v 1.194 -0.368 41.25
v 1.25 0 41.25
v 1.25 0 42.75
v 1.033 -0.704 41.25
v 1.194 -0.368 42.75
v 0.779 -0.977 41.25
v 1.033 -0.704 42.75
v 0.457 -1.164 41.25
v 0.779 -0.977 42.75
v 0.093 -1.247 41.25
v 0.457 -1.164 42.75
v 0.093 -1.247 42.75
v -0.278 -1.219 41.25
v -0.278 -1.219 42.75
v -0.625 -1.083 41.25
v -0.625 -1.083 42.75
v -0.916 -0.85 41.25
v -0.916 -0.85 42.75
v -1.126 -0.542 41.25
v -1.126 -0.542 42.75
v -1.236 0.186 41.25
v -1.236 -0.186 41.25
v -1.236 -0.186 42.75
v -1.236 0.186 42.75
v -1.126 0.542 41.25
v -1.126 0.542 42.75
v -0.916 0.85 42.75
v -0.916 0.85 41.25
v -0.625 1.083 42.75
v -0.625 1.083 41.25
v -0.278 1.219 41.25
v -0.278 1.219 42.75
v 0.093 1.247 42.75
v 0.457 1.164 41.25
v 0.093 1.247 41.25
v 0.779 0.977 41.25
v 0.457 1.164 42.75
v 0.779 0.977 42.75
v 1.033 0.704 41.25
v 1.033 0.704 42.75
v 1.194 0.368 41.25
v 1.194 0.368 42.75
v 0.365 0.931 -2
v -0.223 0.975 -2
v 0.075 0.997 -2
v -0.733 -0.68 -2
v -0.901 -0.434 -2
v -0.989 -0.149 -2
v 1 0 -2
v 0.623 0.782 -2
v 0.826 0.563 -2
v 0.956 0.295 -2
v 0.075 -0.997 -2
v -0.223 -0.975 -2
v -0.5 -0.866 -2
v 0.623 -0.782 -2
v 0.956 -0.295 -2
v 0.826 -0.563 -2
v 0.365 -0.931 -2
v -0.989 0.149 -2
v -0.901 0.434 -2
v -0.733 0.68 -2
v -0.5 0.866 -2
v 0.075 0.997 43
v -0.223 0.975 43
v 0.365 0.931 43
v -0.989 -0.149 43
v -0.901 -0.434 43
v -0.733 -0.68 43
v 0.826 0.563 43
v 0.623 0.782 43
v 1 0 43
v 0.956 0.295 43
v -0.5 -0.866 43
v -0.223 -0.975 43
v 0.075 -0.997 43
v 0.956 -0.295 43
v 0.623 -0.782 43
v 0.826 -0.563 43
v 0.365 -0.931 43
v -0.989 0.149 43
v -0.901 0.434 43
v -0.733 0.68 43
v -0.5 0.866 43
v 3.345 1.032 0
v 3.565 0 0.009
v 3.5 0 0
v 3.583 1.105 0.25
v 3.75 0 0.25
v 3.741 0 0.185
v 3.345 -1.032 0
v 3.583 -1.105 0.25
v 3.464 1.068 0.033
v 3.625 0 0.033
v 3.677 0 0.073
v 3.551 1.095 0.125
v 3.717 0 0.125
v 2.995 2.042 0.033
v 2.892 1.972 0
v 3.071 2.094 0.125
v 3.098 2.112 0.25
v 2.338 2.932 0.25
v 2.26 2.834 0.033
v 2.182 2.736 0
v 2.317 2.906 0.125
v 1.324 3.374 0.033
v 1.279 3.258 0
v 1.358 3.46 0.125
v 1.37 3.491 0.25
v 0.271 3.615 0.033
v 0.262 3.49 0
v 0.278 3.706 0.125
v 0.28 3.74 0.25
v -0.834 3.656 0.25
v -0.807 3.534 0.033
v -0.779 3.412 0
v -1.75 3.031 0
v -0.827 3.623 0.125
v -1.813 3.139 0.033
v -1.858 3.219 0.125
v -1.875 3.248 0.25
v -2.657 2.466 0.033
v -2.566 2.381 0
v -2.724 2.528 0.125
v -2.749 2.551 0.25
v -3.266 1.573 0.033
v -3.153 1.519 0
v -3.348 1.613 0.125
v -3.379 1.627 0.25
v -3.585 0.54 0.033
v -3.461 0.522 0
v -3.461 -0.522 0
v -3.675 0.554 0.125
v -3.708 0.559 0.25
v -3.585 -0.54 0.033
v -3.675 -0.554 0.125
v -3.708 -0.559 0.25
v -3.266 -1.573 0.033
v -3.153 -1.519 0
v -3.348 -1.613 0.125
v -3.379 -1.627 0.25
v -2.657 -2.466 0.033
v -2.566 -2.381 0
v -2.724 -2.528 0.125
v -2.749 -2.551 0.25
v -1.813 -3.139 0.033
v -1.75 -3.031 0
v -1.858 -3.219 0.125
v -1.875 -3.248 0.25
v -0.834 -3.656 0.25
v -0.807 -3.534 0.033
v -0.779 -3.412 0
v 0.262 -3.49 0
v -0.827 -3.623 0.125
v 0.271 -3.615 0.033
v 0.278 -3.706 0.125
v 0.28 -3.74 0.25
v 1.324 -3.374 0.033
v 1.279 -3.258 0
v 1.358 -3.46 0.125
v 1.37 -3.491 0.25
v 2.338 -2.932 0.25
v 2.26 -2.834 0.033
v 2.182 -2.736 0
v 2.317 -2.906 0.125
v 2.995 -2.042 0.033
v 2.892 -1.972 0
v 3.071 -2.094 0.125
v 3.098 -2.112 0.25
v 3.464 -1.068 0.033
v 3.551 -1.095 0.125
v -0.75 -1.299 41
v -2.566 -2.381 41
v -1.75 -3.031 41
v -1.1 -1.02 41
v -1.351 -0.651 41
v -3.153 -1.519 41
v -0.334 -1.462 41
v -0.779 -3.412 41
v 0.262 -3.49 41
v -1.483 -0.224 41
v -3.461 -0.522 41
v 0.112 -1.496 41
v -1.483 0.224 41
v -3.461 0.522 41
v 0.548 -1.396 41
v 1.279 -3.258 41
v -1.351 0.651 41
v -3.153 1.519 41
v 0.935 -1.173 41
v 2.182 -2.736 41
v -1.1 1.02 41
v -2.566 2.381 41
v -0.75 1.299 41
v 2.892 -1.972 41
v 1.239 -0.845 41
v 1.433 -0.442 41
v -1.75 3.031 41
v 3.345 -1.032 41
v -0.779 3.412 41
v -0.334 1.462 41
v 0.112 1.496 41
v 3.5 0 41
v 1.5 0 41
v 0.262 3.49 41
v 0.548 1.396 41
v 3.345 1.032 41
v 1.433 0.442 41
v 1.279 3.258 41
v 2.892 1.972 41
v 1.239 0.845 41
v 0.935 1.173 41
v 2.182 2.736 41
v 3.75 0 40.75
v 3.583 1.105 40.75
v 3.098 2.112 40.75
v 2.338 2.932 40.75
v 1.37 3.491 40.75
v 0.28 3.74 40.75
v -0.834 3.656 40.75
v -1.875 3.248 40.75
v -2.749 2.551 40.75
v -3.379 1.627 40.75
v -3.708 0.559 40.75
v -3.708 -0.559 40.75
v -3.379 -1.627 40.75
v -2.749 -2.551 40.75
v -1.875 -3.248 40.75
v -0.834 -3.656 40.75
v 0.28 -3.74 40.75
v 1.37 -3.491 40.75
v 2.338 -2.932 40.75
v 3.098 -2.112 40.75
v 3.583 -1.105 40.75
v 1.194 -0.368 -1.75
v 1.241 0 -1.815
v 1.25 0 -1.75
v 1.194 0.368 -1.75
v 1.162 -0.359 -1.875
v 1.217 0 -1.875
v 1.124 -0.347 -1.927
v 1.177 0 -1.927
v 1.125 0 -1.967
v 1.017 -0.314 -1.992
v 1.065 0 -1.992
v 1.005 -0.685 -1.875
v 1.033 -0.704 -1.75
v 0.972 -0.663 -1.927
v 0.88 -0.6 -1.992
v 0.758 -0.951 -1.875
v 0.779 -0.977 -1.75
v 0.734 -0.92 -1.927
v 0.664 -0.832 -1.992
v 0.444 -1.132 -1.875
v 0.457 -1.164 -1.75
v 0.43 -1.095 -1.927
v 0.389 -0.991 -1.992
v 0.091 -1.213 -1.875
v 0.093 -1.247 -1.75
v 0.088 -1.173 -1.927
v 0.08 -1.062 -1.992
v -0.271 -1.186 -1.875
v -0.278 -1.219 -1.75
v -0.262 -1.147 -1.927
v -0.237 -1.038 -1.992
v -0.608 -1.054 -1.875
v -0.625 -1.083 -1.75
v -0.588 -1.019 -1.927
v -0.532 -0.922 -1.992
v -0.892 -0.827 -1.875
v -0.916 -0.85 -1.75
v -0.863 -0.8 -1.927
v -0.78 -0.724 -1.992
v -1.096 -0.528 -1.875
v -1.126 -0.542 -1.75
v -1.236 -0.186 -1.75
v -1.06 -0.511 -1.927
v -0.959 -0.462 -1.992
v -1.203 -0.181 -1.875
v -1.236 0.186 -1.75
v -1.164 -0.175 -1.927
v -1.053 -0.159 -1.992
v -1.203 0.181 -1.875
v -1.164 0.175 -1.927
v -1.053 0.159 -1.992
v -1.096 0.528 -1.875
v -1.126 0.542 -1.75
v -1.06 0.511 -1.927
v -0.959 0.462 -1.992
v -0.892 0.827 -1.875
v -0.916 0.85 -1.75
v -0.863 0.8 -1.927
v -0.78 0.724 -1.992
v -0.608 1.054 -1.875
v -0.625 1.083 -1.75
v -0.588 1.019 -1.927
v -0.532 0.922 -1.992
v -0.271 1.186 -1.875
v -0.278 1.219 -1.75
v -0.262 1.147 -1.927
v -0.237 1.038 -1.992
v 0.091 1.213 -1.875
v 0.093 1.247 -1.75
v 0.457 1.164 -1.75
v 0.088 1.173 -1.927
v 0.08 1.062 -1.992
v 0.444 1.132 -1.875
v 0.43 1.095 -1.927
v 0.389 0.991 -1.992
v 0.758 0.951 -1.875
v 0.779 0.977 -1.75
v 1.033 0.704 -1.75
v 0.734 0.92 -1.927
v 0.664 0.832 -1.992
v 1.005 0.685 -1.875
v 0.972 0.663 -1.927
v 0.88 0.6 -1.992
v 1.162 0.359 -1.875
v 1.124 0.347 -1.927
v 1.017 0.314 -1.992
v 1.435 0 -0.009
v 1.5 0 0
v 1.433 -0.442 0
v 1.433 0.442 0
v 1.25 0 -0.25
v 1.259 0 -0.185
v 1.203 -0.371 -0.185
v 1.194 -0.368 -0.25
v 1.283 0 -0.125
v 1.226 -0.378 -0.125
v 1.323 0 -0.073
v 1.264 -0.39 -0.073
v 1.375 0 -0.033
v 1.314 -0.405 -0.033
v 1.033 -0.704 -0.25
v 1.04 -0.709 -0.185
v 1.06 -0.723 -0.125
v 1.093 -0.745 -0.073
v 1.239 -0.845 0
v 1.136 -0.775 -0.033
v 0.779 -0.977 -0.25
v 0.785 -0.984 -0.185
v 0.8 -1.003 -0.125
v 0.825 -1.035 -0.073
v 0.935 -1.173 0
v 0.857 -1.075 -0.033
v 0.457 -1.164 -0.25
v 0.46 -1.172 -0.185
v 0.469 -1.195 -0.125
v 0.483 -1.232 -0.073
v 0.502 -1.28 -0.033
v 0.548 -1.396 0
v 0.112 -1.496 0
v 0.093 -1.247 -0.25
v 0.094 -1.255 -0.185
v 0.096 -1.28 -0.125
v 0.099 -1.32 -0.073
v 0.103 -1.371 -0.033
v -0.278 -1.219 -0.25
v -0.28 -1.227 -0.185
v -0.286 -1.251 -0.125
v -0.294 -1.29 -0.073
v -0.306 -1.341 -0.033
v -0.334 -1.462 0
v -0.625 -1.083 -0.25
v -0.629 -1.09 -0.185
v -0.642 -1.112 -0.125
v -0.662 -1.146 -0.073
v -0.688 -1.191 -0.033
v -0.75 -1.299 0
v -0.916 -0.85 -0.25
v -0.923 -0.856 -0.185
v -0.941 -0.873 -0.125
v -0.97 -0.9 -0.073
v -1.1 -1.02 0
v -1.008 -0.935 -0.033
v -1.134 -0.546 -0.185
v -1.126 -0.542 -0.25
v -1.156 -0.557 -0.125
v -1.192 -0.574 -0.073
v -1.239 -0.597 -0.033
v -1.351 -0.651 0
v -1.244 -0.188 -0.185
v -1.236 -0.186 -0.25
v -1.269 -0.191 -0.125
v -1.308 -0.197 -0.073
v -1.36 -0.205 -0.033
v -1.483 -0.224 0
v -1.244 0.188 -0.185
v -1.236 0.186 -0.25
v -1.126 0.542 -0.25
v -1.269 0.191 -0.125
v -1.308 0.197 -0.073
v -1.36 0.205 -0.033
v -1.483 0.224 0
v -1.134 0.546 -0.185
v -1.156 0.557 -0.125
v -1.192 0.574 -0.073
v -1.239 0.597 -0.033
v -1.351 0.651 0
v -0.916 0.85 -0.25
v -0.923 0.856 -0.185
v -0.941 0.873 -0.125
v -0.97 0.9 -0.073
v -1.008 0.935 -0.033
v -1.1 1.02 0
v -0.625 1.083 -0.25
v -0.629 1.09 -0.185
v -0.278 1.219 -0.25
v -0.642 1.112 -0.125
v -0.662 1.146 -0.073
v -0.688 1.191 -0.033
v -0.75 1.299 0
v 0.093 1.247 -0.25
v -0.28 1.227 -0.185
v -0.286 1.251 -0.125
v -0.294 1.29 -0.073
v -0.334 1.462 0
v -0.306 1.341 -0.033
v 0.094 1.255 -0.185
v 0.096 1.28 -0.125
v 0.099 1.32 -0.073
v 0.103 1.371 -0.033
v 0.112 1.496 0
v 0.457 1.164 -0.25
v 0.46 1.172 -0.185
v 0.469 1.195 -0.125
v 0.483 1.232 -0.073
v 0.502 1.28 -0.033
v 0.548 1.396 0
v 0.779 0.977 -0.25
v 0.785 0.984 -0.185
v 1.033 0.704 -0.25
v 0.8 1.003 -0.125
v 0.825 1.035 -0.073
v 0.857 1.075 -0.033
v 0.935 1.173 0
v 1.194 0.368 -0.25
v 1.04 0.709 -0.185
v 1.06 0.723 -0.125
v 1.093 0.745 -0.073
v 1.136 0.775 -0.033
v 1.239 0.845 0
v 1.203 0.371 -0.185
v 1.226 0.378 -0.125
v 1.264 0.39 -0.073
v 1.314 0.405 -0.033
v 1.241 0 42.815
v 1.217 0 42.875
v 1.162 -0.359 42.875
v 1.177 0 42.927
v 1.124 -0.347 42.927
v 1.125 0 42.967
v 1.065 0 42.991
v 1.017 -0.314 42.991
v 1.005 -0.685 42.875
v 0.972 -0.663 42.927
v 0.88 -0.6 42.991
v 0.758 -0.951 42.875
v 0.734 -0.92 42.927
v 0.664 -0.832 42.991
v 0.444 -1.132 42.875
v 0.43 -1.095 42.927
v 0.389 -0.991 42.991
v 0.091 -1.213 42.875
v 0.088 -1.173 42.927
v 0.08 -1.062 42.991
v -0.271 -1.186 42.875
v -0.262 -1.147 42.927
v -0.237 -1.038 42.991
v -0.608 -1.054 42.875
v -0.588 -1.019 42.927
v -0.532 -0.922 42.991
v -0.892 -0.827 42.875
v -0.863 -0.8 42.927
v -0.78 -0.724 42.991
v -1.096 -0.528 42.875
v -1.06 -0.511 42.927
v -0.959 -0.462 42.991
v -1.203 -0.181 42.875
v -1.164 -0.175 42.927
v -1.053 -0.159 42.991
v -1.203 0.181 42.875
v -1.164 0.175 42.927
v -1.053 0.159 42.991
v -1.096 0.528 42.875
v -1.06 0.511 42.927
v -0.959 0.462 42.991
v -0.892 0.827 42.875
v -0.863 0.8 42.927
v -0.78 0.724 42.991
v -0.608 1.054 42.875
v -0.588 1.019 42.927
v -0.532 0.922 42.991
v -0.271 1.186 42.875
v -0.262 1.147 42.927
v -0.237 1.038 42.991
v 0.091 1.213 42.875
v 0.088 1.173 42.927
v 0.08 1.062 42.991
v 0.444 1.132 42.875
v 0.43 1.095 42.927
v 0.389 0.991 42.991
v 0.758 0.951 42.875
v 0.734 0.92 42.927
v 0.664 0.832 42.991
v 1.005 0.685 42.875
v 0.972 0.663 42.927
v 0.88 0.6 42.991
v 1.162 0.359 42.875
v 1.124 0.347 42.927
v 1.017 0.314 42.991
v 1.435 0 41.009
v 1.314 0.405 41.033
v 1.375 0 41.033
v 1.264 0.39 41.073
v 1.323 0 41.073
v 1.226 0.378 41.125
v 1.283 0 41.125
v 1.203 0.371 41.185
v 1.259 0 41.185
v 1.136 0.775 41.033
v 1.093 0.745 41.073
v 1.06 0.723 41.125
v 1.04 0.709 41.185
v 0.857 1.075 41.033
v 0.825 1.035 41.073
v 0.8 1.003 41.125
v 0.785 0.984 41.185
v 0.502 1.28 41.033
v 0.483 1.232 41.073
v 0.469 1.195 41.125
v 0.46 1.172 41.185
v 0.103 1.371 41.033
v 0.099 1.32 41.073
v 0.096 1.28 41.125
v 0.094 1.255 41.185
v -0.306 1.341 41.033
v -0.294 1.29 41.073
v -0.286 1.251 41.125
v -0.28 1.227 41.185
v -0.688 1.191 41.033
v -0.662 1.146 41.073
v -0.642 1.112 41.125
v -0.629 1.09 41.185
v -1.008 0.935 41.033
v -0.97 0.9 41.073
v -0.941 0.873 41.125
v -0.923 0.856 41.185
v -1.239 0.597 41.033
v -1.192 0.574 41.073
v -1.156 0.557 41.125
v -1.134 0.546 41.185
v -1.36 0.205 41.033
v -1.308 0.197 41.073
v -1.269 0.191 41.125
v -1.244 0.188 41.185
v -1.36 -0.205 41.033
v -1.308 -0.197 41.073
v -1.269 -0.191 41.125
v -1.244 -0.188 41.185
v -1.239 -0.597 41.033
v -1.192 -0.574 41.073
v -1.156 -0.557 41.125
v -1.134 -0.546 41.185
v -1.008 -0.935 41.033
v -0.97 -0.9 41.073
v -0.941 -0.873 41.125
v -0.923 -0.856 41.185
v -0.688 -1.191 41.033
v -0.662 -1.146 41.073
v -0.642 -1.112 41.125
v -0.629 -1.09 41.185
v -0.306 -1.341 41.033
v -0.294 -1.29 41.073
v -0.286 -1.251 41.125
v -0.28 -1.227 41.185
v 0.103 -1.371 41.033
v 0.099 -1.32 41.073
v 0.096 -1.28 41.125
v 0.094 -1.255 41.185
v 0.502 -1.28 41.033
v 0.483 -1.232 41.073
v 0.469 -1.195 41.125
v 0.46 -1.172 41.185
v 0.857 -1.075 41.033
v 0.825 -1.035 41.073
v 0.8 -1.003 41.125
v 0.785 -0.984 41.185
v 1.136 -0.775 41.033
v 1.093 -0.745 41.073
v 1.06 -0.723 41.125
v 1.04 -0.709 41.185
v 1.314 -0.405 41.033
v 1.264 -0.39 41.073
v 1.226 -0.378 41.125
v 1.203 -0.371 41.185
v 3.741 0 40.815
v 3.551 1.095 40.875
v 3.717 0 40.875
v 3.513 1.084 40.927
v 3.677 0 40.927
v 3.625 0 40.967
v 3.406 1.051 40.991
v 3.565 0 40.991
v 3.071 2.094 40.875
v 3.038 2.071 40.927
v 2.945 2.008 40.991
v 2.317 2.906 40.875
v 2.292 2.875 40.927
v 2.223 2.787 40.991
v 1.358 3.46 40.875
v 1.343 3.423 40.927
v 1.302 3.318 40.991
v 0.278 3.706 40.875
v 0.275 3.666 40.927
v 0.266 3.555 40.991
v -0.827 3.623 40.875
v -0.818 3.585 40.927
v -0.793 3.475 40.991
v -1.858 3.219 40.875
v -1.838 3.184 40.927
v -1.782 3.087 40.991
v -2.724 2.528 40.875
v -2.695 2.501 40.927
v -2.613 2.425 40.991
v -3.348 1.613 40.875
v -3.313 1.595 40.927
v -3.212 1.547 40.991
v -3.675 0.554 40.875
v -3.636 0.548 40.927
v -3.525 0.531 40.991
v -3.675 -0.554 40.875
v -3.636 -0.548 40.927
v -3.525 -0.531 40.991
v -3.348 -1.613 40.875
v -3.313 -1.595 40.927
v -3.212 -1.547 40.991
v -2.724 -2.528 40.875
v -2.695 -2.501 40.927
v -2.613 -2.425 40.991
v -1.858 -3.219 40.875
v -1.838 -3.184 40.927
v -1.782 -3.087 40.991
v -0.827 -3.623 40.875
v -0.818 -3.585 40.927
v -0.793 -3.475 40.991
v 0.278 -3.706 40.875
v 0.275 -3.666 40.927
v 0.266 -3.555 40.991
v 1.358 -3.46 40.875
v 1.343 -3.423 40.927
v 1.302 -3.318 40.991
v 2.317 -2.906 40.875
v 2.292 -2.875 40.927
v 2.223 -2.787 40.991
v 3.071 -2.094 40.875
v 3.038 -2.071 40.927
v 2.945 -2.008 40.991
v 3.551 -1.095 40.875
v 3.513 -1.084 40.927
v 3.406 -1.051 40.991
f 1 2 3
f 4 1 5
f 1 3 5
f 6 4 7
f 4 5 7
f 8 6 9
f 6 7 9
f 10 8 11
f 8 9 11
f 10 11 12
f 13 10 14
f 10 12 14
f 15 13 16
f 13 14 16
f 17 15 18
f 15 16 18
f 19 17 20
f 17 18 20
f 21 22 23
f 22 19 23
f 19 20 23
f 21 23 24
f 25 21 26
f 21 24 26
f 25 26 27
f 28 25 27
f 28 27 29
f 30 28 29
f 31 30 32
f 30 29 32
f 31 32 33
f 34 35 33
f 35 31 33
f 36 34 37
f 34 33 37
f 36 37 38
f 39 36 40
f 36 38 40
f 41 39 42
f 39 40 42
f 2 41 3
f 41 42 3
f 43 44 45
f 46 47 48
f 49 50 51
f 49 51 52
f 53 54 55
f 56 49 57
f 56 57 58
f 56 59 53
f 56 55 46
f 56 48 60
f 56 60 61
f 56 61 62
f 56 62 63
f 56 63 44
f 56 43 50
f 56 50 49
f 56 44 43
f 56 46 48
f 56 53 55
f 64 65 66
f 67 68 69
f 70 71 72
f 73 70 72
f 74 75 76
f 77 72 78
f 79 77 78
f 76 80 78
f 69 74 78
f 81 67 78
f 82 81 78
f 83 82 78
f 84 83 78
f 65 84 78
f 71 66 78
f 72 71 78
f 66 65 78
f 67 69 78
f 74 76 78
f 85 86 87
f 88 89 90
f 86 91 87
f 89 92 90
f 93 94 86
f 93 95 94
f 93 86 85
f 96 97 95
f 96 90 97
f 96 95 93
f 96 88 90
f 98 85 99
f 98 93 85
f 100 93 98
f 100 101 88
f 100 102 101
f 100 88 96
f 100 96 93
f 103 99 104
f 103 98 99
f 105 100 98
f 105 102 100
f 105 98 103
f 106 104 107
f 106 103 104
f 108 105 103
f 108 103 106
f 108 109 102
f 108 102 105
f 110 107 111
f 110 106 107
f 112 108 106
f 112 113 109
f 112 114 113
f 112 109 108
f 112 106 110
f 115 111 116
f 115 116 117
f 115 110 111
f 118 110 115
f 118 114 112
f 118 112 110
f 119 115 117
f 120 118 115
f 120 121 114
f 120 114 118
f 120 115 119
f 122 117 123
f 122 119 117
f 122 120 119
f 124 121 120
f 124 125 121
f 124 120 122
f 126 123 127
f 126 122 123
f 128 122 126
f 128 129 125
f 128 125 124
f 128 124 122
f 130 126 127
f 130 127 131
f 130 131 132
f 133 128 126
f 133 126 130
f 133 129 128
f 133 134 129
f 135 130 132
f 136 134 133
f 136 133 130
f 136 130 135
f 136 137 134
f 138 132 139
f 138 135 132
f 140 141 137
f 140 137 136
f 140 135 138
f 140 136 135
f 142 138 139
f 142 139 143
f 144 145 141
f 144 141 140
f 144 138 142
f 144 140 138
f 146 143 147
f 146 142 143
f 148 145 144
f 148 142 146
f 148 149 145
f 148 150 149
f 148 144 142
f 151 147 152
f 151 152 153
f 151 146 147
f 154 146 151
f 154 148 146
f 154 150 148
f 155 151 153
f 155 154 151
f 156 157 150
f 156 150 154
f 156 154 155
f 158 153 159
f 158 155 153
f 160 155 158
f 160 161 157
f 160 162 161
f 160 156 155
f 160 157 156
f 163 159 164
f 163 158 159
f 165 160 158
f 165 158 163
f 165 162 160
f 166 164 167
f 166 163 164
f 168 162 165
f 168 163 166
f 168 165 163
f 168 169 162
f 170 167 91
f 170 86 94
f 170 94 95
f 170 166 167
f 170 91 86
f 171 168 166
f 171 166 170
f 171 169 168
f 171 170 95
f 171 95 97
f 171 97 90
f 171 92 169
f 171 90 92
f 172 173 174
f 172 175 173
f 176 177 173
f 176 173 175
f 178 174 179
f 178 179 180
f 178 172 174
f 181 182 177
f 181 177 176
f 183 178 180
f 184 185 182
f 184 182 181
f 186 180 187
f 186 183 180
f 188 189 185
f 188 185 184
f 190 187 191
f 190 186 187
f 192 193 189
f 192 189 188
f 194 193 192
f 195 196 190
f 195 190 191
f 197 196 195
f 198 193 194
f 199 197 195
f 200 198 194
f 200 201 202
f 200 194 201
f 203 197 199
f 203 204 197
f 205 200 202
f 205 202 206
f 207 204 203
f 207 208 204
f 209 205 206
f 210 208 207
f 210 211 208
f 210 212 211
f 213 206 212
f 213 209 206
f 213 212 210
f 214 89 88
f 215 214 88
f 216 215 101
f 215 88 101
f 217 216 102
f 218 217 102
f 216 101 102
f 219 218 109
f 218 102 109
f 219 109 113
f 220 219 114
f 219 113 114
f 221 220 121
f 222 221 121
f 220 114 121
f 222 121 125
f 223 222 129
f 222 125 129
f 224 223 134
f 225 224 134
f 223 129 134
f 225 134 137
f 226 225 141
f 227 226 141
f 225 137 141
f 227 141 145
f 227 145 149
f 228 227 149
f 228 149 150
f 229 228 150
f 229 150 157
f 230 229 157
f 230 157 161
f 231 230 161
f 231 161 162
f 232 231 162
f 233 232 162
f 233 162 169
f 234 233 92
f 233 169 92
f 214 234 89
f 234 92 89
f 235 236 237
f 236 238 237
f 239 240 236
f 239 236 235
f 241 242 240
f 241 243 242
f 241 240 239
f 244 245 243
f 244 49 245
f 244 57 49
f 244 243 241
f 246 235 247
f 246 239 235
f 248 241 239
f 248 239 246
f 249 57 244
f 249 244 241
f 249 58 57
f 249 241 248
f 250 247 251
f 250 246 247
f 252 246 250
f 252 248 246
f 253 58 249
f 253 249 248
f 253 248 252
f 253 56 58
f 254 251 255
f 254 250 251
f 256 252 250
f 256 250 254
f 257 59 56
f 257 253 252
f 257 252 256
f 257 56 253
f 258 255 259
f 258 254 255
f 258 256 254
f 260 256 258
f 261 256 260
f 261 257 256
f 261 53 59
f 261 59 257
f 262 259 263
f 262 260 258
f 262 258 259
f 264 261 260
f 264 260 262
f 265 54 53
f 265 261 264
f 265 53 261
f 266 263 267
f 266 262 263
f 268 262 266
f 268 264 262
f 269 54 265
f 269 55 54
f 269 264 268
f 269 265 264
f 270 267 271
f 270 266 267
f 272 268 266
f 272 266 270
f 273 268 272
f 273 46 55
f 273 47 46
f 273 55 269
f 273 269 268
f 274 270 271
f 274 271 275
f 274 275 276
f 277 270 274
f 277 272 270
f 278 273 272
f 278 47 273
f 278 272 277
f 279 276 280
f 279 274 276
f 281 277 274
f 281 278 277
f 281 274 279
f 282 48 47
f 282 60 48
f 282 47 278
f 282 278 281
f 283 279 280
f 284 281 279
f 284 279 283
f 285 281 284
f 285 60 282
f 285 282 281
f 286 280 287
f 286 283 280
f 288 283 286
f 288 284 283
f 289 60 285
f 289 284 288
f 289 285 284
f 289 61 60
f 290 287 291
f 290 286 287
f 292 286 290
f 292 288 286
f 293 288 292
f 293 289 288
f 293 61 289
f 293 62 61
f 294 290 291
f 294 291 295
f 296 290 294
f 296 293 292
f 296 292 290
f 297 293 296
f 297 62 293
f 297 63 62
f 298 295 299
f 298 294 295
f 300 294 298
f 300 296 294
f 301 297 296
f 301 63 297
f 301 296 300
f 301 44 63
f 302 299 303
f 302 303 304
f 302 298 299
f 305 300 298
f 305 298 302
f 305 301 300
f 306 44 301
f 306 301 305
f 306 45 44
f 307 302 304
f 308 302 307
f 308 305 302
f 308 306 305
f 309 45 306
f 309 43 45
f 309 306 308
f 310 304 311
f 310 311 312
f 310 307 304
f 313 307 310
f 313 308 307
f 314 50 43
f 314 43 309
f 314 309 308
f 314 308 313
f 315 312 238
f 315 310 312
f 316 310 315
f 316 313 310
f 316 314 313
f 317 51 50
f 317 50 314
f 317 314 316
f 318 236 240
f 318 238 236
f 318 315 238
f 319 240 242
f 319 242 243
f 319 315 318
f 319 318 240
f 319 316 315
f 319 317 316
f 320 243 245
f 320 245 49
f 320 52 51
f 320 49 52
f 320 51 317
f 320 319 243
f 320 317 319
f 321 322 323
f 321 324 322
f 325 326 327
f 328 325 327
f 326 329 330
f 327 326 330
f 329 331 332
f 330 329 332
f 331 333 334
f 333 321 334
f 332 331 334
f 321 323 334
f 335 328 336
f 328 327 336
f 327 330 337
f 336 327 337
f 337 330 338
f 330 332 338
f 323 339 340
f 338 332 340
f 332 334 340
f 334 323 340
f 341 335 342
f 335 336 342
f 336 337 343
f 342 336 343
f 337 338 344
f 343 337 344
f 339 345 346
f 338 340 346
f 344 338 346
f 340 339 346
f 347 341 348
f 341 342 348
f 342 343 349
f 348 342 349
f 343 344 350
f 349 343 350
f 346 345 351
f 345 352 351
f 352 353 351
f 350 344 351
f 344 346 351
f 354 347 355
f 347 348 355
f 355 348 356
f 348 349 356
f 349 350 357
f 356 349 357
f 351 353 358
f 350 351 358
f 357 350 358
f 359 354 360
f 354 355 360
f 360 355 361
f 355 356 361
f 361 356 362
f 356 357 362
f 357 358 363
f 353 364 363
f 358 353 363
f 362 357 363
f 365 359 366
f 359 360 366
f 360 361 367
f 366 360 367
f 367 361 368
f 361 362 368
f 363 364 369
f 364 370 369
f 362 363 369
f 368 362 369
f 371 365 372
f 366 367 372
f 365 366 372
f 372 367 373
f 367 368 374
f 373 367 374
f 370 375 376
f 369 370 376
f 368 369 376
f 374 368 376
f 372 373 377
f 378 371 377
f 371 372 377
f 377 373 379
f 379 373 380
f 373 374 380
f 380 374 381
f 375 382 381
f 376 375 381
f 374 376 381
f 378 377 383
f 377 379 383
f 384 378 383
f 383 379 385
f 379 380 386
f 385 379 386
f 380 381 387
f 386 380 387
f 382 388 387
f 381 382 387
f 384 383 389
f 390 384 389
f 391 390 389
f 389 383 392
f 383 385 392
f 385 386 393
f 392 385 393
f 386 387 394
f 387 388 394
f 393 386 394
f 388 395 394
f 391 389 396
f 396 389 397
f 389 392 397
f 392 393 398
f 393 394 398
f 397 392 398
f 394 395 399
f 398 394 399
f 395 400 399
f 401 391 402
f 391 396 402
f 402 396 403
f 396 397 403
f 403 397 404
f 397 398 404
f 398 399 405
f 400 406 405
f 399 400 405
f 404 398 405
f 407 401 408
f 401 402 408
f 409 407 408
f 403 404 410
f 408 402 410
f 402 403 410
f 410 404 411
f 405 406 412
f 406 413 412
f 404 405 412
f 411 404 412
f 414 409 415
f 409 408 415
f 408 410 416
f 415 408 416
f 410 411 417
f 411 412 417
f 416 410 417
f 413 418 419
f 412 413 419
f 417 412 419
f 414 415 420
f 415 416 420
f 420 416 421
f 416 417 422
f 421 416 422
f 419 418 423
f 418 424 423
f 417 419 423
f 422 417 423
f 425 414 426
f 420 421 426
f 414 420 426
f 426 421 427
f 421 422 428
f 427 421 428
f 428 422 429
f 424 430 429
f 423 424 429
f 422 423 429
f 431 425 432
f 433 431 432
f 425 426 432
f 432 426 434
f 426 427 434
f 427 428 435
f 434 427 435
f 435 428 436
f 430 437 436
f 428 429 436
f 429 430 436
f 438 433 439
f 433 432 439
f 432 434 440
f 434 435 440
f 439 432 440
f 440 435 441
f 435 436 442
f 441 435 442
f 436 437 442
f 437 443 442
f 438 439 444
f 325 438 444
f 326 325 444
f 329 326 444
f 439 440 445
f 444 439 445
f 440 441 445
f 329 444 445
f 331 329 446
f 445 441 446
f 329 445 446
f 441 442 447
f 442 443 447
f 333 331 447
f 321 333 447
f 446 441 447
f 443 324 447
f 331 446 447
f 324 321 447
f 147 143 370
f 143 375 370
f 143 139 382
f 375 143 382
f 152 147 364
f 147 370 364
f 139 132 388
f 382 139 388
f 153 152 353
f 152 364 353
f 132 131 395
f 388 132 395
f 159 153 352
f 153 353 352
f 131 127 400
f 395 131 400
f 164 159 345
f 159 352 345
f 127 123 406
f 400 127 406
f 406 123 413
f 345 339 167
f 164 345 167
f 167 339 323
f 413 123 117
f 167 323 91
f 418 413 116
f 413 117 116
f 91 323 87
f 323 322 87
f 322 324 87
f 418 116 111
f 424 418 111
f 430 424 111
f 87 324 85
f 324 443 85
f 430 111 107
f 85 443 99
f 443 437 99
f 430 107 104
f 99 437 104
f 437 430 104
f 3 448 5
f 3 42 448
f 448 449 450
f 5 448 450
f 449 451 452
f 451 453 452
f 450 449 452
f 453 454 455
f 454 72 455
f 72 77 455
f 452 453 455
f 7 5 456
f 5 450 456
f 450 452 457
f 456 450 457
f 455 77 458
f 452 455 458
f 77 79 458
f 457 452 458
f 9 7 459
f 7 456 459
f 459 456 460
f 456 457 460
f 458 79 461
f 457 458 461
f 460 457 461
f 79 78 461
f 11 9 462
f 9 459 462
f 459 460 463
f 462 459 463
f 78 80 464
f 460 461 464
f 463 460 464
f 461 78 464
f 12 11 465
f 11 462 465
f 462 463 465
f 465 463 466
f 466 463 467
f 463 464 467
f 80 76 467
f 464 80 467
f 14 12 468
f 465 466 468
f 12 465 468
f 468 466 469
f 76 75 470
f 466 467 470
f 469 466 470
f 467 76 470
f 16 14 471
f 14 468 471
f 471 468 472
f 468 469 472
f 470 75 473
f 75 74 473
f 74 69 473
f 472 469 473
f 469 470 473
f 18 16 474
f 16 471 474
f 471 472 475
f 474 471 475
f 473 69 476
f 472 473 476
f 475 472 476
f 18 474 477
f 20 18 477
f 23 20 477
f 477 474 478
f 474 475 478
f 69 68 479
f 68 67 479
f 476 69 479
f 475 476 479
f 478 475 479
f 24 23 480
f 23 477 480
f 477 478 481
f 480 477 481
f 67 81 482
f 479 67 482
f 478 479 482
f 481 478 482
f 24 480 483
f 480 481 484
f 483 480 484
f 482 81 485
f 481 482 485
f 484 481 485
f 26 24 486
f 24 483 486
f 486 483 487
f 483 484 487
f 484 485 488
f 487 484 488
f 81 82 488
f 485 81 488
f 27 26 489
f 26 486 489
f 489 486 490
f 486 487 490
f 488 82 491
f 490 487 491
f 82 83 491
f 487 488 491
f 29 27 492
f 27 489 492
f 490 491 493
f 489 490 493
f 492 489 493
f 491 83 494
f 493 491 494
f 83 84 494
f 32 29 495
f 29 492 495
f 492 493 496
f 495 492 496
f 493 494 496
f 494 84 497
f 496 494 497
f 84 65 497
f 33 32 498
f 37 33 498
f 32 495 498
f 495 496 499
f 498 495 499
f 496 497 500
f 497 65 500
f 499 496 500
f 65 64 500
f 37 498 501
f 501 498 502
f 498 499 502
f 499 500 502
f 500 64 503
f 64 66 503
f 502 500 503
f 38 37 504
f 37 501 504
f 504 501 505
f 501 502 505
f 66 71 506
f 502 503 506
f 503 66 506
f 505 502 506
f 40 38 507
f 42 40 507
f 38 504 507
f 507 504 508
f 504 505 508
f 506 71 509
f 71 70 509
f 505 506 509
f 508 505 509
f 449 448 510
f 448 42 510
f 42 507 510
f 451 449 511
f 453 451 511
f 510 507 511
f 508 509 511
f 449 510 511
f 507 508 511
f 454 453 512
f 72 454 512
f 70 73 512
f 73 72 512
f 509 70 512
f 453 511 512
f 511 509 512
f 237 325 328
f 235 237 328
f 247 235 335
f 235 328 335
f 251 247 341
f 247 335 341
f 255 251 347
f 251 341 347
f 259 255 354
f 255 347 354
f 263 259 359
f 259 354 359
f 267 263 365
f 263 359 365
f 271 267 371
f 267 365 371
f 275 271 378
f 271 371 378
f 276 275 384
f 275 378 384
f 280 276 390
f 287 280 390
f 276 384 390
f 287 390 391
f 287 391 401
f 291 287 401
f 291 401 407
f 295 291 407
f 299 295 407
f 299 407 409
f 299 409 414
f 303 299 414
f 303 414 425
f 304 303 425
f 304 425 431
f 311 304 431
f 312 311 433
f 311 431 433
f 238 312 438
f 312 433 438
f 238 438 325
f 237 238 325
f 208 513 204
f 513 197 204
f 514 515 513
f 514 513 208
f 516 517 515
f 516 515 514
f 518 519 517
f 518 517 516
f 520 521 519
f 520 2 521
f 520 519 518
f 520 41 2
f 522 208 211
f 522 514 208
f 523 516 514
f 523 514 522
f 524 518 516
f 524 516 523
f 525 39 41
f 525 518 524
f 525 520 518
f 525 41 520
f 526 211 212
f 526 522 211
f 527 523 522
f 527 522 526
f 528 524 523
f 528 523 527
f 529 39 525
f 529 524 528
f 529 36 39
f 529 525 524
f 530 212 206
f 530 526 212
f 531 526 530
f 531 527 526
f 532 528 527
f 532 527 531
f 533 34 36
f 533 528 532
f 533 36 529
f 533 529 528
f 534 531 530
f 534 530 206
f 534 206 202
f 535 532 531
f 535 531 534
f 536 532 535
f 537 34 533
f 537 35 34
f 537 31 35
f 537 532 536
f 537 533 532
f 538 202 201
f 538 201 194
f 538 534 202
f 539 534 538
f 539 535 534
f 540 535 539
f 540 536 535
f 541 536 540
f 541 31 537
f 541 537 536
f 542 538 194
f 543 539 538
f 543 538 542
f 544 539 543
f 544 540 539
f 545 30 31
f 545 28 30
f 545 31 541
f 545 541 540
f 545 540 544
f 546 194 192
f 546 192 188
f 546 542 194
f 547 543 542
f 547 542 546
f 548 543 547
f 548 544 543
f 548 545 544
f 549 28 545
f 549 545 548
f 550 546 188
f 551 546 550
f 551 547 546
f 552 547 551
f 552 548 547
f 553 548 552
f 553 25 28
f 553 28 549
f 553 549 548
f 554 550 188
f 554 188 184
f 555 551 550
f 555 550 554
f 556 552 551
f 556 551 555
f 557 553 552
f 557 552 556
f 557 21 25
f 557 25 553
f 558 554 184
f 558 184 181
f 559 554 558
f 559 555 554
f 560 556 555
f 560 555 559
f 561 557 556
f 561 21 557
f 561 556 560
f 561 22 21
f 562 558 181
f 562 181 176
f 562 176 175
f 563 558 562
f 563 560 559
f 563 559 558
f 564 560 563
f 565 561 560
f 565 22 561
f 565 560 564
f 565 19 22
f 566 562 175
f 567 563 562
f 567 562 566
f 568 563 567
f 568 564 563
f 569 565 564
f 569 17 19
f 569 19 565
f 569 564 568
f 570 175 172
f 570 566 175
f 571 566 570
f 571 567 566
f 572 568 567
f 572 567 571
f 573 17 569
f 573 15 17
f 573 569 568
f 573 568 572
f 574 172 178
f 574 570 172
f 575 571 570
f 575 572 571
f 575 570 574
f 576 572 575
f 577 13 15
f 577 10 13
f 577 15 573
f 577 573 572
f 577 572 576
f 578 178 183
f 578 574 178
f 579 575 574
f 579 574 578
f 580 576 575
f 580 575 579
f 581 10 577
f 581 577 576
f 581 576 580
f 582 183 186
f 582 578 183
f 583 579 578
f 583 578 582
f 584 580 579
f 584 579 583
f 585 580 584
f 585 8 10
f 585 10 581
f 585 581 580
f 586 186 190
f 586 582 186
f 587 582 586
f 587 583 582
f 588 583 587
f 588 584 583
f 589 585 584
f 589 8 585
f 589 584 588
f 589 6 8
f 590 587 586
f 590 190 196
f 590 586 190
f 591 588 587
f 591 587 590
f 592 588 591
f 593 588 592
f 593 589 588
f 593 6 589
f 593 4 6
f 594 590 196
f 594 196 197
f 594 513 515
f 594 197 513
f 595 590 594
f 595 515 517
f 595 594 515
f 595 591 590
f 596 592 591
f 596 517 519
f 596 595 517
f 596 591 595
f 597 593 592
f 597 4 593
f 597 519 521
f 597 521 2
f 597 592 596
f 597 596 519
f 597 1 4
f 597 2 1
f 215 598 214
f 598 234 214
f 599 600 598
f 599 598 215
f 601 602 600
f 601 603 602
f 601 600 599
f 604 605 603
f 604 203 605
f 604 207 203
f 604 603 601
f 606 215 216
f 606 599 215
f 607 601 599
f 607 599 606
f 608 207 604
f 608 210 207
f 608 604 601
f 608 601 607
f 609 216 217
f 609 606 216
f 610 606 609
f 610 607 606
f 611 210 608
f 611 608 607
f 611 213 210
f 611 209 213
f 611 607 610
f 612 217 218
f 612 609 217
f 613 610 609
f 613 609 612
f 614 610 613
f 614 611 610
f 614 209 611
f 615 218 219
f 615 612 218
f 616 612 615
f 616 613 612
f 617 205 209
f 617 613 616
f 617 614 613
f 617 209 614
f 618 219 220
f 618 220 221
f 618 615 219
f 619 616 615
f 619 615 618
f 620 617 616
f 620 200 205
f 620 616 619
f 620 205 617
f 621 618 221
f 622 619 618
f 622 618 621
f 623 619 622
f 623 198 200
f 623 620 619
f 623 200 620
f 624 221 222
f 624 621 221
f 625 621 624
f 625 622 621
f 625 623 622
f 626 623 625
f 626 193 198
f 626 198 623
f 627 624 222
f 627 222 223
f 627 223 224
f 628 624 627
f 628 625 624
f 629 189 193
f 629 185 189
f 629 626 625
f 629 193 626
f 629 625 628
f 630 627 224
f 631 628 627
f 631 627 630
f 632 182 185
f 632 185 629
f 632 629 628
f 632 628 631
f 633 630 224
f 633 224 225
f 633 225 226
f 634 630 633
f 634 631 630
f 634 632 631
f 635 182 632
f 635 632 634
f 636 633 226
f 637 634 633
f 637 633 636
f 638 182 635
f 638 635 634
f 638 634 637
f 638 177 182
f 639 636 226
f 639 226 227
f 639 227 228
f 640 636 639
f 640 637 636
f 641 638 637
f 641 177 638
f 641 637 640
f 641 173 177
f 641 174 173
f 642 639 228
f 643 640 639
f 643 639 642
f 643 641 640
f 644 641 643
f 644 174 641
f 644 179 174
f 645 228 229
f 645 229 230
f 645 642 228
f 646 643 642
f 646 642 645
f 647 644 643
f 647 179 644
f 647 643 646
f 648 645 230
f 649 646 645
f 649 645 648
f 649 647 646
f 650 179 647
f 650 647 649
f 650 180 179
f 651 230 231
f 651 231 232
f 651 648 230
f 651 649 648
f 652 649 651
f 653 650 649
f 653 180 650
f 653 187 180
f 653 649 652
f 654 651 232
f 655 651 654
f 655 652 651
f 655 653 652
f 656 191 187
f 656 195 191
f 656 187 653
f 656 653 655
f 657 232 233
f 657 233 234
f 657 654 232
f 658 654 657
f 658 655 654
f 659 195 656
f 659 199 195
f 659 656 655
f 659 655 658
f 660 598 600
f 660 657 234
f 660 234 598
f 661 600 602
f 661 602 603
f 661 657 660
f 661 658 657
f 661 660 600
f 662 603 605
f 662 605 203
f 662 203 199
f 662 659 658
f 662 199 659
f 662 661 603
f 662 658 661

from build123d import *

# Parameters (mm, degrees)
CROQUIS1_R                   = 3.75
SALIENTE_EXTRUIR1_DEPTH      = 41
CROQUIS2_R                   = 1.25
SALIENTE_EXTRUIR2_DEPTH      = 2
SALIENTE_EXTRUIR3_DEPTH      = 0.0001
SALIENTE_EXTRUIR3_DEPTH_BACK = 45
CROQUIS3_R                   = 1.25
REDONDEO9_R                  = 0.25


with BuildPart() as part:
    # Croquis1 → Saliente-Extruir1 (new body)
    with BuildSketch(Plane.XY):
        Circle(CROQUIS1_R)
    extrude(amount=SALIENTE_EXTRUIR1_DEPTH)

    # Croquis2 → Saliente-Extruir2 (add)
    with BuildSketch(Plane(origin=(0, 0, 0), x_dir=(-1, 0, 0), z_dir=(0, 0, -1))):
        with Locations(Location((0, 0, 0), (0, 0, 180))):
            Circle(CROQUIS2_R)
    extrude(amount=SALIENTE_EXTRUIR2_DEPTH)

    # Croquis3 → Saliente-Extruir3 (add, two sides: drawn at the far end of the back side and taken through both)
    with BuildSketch(Plane(origin=(0, 0, -2), x_dir=(-1, 0, 0), z_dir=(0, 0, -1)).offset(-SALIENTE_EXTRUIR3_DEPTH_BACK)):
        with Locations(Location((0, 0, 0), (0, 0, 180))):
            Circle(CROQUIS3_R)
    extrude(amount=SALIENTE_EXTRUIR3_DEPTH + SALIENTE_EXTRUIR3_DEPTH_BACK)

    # Redondeo9
    redondeo9_edges = [part.edges().sort_by_distance(p)[0] for p in [
        (-1.25, 0, 43),
        (-1.25, 0, -2.0001),
        (-3.75, 0, 0),
        (-3.75, 0, 41),
        (-1.25, 0, 0),
        (-1.25, 0, 41),
    ]]
    fillet(redondeo9_edges, radius=REDONDEO9_R)


solid = part.part
